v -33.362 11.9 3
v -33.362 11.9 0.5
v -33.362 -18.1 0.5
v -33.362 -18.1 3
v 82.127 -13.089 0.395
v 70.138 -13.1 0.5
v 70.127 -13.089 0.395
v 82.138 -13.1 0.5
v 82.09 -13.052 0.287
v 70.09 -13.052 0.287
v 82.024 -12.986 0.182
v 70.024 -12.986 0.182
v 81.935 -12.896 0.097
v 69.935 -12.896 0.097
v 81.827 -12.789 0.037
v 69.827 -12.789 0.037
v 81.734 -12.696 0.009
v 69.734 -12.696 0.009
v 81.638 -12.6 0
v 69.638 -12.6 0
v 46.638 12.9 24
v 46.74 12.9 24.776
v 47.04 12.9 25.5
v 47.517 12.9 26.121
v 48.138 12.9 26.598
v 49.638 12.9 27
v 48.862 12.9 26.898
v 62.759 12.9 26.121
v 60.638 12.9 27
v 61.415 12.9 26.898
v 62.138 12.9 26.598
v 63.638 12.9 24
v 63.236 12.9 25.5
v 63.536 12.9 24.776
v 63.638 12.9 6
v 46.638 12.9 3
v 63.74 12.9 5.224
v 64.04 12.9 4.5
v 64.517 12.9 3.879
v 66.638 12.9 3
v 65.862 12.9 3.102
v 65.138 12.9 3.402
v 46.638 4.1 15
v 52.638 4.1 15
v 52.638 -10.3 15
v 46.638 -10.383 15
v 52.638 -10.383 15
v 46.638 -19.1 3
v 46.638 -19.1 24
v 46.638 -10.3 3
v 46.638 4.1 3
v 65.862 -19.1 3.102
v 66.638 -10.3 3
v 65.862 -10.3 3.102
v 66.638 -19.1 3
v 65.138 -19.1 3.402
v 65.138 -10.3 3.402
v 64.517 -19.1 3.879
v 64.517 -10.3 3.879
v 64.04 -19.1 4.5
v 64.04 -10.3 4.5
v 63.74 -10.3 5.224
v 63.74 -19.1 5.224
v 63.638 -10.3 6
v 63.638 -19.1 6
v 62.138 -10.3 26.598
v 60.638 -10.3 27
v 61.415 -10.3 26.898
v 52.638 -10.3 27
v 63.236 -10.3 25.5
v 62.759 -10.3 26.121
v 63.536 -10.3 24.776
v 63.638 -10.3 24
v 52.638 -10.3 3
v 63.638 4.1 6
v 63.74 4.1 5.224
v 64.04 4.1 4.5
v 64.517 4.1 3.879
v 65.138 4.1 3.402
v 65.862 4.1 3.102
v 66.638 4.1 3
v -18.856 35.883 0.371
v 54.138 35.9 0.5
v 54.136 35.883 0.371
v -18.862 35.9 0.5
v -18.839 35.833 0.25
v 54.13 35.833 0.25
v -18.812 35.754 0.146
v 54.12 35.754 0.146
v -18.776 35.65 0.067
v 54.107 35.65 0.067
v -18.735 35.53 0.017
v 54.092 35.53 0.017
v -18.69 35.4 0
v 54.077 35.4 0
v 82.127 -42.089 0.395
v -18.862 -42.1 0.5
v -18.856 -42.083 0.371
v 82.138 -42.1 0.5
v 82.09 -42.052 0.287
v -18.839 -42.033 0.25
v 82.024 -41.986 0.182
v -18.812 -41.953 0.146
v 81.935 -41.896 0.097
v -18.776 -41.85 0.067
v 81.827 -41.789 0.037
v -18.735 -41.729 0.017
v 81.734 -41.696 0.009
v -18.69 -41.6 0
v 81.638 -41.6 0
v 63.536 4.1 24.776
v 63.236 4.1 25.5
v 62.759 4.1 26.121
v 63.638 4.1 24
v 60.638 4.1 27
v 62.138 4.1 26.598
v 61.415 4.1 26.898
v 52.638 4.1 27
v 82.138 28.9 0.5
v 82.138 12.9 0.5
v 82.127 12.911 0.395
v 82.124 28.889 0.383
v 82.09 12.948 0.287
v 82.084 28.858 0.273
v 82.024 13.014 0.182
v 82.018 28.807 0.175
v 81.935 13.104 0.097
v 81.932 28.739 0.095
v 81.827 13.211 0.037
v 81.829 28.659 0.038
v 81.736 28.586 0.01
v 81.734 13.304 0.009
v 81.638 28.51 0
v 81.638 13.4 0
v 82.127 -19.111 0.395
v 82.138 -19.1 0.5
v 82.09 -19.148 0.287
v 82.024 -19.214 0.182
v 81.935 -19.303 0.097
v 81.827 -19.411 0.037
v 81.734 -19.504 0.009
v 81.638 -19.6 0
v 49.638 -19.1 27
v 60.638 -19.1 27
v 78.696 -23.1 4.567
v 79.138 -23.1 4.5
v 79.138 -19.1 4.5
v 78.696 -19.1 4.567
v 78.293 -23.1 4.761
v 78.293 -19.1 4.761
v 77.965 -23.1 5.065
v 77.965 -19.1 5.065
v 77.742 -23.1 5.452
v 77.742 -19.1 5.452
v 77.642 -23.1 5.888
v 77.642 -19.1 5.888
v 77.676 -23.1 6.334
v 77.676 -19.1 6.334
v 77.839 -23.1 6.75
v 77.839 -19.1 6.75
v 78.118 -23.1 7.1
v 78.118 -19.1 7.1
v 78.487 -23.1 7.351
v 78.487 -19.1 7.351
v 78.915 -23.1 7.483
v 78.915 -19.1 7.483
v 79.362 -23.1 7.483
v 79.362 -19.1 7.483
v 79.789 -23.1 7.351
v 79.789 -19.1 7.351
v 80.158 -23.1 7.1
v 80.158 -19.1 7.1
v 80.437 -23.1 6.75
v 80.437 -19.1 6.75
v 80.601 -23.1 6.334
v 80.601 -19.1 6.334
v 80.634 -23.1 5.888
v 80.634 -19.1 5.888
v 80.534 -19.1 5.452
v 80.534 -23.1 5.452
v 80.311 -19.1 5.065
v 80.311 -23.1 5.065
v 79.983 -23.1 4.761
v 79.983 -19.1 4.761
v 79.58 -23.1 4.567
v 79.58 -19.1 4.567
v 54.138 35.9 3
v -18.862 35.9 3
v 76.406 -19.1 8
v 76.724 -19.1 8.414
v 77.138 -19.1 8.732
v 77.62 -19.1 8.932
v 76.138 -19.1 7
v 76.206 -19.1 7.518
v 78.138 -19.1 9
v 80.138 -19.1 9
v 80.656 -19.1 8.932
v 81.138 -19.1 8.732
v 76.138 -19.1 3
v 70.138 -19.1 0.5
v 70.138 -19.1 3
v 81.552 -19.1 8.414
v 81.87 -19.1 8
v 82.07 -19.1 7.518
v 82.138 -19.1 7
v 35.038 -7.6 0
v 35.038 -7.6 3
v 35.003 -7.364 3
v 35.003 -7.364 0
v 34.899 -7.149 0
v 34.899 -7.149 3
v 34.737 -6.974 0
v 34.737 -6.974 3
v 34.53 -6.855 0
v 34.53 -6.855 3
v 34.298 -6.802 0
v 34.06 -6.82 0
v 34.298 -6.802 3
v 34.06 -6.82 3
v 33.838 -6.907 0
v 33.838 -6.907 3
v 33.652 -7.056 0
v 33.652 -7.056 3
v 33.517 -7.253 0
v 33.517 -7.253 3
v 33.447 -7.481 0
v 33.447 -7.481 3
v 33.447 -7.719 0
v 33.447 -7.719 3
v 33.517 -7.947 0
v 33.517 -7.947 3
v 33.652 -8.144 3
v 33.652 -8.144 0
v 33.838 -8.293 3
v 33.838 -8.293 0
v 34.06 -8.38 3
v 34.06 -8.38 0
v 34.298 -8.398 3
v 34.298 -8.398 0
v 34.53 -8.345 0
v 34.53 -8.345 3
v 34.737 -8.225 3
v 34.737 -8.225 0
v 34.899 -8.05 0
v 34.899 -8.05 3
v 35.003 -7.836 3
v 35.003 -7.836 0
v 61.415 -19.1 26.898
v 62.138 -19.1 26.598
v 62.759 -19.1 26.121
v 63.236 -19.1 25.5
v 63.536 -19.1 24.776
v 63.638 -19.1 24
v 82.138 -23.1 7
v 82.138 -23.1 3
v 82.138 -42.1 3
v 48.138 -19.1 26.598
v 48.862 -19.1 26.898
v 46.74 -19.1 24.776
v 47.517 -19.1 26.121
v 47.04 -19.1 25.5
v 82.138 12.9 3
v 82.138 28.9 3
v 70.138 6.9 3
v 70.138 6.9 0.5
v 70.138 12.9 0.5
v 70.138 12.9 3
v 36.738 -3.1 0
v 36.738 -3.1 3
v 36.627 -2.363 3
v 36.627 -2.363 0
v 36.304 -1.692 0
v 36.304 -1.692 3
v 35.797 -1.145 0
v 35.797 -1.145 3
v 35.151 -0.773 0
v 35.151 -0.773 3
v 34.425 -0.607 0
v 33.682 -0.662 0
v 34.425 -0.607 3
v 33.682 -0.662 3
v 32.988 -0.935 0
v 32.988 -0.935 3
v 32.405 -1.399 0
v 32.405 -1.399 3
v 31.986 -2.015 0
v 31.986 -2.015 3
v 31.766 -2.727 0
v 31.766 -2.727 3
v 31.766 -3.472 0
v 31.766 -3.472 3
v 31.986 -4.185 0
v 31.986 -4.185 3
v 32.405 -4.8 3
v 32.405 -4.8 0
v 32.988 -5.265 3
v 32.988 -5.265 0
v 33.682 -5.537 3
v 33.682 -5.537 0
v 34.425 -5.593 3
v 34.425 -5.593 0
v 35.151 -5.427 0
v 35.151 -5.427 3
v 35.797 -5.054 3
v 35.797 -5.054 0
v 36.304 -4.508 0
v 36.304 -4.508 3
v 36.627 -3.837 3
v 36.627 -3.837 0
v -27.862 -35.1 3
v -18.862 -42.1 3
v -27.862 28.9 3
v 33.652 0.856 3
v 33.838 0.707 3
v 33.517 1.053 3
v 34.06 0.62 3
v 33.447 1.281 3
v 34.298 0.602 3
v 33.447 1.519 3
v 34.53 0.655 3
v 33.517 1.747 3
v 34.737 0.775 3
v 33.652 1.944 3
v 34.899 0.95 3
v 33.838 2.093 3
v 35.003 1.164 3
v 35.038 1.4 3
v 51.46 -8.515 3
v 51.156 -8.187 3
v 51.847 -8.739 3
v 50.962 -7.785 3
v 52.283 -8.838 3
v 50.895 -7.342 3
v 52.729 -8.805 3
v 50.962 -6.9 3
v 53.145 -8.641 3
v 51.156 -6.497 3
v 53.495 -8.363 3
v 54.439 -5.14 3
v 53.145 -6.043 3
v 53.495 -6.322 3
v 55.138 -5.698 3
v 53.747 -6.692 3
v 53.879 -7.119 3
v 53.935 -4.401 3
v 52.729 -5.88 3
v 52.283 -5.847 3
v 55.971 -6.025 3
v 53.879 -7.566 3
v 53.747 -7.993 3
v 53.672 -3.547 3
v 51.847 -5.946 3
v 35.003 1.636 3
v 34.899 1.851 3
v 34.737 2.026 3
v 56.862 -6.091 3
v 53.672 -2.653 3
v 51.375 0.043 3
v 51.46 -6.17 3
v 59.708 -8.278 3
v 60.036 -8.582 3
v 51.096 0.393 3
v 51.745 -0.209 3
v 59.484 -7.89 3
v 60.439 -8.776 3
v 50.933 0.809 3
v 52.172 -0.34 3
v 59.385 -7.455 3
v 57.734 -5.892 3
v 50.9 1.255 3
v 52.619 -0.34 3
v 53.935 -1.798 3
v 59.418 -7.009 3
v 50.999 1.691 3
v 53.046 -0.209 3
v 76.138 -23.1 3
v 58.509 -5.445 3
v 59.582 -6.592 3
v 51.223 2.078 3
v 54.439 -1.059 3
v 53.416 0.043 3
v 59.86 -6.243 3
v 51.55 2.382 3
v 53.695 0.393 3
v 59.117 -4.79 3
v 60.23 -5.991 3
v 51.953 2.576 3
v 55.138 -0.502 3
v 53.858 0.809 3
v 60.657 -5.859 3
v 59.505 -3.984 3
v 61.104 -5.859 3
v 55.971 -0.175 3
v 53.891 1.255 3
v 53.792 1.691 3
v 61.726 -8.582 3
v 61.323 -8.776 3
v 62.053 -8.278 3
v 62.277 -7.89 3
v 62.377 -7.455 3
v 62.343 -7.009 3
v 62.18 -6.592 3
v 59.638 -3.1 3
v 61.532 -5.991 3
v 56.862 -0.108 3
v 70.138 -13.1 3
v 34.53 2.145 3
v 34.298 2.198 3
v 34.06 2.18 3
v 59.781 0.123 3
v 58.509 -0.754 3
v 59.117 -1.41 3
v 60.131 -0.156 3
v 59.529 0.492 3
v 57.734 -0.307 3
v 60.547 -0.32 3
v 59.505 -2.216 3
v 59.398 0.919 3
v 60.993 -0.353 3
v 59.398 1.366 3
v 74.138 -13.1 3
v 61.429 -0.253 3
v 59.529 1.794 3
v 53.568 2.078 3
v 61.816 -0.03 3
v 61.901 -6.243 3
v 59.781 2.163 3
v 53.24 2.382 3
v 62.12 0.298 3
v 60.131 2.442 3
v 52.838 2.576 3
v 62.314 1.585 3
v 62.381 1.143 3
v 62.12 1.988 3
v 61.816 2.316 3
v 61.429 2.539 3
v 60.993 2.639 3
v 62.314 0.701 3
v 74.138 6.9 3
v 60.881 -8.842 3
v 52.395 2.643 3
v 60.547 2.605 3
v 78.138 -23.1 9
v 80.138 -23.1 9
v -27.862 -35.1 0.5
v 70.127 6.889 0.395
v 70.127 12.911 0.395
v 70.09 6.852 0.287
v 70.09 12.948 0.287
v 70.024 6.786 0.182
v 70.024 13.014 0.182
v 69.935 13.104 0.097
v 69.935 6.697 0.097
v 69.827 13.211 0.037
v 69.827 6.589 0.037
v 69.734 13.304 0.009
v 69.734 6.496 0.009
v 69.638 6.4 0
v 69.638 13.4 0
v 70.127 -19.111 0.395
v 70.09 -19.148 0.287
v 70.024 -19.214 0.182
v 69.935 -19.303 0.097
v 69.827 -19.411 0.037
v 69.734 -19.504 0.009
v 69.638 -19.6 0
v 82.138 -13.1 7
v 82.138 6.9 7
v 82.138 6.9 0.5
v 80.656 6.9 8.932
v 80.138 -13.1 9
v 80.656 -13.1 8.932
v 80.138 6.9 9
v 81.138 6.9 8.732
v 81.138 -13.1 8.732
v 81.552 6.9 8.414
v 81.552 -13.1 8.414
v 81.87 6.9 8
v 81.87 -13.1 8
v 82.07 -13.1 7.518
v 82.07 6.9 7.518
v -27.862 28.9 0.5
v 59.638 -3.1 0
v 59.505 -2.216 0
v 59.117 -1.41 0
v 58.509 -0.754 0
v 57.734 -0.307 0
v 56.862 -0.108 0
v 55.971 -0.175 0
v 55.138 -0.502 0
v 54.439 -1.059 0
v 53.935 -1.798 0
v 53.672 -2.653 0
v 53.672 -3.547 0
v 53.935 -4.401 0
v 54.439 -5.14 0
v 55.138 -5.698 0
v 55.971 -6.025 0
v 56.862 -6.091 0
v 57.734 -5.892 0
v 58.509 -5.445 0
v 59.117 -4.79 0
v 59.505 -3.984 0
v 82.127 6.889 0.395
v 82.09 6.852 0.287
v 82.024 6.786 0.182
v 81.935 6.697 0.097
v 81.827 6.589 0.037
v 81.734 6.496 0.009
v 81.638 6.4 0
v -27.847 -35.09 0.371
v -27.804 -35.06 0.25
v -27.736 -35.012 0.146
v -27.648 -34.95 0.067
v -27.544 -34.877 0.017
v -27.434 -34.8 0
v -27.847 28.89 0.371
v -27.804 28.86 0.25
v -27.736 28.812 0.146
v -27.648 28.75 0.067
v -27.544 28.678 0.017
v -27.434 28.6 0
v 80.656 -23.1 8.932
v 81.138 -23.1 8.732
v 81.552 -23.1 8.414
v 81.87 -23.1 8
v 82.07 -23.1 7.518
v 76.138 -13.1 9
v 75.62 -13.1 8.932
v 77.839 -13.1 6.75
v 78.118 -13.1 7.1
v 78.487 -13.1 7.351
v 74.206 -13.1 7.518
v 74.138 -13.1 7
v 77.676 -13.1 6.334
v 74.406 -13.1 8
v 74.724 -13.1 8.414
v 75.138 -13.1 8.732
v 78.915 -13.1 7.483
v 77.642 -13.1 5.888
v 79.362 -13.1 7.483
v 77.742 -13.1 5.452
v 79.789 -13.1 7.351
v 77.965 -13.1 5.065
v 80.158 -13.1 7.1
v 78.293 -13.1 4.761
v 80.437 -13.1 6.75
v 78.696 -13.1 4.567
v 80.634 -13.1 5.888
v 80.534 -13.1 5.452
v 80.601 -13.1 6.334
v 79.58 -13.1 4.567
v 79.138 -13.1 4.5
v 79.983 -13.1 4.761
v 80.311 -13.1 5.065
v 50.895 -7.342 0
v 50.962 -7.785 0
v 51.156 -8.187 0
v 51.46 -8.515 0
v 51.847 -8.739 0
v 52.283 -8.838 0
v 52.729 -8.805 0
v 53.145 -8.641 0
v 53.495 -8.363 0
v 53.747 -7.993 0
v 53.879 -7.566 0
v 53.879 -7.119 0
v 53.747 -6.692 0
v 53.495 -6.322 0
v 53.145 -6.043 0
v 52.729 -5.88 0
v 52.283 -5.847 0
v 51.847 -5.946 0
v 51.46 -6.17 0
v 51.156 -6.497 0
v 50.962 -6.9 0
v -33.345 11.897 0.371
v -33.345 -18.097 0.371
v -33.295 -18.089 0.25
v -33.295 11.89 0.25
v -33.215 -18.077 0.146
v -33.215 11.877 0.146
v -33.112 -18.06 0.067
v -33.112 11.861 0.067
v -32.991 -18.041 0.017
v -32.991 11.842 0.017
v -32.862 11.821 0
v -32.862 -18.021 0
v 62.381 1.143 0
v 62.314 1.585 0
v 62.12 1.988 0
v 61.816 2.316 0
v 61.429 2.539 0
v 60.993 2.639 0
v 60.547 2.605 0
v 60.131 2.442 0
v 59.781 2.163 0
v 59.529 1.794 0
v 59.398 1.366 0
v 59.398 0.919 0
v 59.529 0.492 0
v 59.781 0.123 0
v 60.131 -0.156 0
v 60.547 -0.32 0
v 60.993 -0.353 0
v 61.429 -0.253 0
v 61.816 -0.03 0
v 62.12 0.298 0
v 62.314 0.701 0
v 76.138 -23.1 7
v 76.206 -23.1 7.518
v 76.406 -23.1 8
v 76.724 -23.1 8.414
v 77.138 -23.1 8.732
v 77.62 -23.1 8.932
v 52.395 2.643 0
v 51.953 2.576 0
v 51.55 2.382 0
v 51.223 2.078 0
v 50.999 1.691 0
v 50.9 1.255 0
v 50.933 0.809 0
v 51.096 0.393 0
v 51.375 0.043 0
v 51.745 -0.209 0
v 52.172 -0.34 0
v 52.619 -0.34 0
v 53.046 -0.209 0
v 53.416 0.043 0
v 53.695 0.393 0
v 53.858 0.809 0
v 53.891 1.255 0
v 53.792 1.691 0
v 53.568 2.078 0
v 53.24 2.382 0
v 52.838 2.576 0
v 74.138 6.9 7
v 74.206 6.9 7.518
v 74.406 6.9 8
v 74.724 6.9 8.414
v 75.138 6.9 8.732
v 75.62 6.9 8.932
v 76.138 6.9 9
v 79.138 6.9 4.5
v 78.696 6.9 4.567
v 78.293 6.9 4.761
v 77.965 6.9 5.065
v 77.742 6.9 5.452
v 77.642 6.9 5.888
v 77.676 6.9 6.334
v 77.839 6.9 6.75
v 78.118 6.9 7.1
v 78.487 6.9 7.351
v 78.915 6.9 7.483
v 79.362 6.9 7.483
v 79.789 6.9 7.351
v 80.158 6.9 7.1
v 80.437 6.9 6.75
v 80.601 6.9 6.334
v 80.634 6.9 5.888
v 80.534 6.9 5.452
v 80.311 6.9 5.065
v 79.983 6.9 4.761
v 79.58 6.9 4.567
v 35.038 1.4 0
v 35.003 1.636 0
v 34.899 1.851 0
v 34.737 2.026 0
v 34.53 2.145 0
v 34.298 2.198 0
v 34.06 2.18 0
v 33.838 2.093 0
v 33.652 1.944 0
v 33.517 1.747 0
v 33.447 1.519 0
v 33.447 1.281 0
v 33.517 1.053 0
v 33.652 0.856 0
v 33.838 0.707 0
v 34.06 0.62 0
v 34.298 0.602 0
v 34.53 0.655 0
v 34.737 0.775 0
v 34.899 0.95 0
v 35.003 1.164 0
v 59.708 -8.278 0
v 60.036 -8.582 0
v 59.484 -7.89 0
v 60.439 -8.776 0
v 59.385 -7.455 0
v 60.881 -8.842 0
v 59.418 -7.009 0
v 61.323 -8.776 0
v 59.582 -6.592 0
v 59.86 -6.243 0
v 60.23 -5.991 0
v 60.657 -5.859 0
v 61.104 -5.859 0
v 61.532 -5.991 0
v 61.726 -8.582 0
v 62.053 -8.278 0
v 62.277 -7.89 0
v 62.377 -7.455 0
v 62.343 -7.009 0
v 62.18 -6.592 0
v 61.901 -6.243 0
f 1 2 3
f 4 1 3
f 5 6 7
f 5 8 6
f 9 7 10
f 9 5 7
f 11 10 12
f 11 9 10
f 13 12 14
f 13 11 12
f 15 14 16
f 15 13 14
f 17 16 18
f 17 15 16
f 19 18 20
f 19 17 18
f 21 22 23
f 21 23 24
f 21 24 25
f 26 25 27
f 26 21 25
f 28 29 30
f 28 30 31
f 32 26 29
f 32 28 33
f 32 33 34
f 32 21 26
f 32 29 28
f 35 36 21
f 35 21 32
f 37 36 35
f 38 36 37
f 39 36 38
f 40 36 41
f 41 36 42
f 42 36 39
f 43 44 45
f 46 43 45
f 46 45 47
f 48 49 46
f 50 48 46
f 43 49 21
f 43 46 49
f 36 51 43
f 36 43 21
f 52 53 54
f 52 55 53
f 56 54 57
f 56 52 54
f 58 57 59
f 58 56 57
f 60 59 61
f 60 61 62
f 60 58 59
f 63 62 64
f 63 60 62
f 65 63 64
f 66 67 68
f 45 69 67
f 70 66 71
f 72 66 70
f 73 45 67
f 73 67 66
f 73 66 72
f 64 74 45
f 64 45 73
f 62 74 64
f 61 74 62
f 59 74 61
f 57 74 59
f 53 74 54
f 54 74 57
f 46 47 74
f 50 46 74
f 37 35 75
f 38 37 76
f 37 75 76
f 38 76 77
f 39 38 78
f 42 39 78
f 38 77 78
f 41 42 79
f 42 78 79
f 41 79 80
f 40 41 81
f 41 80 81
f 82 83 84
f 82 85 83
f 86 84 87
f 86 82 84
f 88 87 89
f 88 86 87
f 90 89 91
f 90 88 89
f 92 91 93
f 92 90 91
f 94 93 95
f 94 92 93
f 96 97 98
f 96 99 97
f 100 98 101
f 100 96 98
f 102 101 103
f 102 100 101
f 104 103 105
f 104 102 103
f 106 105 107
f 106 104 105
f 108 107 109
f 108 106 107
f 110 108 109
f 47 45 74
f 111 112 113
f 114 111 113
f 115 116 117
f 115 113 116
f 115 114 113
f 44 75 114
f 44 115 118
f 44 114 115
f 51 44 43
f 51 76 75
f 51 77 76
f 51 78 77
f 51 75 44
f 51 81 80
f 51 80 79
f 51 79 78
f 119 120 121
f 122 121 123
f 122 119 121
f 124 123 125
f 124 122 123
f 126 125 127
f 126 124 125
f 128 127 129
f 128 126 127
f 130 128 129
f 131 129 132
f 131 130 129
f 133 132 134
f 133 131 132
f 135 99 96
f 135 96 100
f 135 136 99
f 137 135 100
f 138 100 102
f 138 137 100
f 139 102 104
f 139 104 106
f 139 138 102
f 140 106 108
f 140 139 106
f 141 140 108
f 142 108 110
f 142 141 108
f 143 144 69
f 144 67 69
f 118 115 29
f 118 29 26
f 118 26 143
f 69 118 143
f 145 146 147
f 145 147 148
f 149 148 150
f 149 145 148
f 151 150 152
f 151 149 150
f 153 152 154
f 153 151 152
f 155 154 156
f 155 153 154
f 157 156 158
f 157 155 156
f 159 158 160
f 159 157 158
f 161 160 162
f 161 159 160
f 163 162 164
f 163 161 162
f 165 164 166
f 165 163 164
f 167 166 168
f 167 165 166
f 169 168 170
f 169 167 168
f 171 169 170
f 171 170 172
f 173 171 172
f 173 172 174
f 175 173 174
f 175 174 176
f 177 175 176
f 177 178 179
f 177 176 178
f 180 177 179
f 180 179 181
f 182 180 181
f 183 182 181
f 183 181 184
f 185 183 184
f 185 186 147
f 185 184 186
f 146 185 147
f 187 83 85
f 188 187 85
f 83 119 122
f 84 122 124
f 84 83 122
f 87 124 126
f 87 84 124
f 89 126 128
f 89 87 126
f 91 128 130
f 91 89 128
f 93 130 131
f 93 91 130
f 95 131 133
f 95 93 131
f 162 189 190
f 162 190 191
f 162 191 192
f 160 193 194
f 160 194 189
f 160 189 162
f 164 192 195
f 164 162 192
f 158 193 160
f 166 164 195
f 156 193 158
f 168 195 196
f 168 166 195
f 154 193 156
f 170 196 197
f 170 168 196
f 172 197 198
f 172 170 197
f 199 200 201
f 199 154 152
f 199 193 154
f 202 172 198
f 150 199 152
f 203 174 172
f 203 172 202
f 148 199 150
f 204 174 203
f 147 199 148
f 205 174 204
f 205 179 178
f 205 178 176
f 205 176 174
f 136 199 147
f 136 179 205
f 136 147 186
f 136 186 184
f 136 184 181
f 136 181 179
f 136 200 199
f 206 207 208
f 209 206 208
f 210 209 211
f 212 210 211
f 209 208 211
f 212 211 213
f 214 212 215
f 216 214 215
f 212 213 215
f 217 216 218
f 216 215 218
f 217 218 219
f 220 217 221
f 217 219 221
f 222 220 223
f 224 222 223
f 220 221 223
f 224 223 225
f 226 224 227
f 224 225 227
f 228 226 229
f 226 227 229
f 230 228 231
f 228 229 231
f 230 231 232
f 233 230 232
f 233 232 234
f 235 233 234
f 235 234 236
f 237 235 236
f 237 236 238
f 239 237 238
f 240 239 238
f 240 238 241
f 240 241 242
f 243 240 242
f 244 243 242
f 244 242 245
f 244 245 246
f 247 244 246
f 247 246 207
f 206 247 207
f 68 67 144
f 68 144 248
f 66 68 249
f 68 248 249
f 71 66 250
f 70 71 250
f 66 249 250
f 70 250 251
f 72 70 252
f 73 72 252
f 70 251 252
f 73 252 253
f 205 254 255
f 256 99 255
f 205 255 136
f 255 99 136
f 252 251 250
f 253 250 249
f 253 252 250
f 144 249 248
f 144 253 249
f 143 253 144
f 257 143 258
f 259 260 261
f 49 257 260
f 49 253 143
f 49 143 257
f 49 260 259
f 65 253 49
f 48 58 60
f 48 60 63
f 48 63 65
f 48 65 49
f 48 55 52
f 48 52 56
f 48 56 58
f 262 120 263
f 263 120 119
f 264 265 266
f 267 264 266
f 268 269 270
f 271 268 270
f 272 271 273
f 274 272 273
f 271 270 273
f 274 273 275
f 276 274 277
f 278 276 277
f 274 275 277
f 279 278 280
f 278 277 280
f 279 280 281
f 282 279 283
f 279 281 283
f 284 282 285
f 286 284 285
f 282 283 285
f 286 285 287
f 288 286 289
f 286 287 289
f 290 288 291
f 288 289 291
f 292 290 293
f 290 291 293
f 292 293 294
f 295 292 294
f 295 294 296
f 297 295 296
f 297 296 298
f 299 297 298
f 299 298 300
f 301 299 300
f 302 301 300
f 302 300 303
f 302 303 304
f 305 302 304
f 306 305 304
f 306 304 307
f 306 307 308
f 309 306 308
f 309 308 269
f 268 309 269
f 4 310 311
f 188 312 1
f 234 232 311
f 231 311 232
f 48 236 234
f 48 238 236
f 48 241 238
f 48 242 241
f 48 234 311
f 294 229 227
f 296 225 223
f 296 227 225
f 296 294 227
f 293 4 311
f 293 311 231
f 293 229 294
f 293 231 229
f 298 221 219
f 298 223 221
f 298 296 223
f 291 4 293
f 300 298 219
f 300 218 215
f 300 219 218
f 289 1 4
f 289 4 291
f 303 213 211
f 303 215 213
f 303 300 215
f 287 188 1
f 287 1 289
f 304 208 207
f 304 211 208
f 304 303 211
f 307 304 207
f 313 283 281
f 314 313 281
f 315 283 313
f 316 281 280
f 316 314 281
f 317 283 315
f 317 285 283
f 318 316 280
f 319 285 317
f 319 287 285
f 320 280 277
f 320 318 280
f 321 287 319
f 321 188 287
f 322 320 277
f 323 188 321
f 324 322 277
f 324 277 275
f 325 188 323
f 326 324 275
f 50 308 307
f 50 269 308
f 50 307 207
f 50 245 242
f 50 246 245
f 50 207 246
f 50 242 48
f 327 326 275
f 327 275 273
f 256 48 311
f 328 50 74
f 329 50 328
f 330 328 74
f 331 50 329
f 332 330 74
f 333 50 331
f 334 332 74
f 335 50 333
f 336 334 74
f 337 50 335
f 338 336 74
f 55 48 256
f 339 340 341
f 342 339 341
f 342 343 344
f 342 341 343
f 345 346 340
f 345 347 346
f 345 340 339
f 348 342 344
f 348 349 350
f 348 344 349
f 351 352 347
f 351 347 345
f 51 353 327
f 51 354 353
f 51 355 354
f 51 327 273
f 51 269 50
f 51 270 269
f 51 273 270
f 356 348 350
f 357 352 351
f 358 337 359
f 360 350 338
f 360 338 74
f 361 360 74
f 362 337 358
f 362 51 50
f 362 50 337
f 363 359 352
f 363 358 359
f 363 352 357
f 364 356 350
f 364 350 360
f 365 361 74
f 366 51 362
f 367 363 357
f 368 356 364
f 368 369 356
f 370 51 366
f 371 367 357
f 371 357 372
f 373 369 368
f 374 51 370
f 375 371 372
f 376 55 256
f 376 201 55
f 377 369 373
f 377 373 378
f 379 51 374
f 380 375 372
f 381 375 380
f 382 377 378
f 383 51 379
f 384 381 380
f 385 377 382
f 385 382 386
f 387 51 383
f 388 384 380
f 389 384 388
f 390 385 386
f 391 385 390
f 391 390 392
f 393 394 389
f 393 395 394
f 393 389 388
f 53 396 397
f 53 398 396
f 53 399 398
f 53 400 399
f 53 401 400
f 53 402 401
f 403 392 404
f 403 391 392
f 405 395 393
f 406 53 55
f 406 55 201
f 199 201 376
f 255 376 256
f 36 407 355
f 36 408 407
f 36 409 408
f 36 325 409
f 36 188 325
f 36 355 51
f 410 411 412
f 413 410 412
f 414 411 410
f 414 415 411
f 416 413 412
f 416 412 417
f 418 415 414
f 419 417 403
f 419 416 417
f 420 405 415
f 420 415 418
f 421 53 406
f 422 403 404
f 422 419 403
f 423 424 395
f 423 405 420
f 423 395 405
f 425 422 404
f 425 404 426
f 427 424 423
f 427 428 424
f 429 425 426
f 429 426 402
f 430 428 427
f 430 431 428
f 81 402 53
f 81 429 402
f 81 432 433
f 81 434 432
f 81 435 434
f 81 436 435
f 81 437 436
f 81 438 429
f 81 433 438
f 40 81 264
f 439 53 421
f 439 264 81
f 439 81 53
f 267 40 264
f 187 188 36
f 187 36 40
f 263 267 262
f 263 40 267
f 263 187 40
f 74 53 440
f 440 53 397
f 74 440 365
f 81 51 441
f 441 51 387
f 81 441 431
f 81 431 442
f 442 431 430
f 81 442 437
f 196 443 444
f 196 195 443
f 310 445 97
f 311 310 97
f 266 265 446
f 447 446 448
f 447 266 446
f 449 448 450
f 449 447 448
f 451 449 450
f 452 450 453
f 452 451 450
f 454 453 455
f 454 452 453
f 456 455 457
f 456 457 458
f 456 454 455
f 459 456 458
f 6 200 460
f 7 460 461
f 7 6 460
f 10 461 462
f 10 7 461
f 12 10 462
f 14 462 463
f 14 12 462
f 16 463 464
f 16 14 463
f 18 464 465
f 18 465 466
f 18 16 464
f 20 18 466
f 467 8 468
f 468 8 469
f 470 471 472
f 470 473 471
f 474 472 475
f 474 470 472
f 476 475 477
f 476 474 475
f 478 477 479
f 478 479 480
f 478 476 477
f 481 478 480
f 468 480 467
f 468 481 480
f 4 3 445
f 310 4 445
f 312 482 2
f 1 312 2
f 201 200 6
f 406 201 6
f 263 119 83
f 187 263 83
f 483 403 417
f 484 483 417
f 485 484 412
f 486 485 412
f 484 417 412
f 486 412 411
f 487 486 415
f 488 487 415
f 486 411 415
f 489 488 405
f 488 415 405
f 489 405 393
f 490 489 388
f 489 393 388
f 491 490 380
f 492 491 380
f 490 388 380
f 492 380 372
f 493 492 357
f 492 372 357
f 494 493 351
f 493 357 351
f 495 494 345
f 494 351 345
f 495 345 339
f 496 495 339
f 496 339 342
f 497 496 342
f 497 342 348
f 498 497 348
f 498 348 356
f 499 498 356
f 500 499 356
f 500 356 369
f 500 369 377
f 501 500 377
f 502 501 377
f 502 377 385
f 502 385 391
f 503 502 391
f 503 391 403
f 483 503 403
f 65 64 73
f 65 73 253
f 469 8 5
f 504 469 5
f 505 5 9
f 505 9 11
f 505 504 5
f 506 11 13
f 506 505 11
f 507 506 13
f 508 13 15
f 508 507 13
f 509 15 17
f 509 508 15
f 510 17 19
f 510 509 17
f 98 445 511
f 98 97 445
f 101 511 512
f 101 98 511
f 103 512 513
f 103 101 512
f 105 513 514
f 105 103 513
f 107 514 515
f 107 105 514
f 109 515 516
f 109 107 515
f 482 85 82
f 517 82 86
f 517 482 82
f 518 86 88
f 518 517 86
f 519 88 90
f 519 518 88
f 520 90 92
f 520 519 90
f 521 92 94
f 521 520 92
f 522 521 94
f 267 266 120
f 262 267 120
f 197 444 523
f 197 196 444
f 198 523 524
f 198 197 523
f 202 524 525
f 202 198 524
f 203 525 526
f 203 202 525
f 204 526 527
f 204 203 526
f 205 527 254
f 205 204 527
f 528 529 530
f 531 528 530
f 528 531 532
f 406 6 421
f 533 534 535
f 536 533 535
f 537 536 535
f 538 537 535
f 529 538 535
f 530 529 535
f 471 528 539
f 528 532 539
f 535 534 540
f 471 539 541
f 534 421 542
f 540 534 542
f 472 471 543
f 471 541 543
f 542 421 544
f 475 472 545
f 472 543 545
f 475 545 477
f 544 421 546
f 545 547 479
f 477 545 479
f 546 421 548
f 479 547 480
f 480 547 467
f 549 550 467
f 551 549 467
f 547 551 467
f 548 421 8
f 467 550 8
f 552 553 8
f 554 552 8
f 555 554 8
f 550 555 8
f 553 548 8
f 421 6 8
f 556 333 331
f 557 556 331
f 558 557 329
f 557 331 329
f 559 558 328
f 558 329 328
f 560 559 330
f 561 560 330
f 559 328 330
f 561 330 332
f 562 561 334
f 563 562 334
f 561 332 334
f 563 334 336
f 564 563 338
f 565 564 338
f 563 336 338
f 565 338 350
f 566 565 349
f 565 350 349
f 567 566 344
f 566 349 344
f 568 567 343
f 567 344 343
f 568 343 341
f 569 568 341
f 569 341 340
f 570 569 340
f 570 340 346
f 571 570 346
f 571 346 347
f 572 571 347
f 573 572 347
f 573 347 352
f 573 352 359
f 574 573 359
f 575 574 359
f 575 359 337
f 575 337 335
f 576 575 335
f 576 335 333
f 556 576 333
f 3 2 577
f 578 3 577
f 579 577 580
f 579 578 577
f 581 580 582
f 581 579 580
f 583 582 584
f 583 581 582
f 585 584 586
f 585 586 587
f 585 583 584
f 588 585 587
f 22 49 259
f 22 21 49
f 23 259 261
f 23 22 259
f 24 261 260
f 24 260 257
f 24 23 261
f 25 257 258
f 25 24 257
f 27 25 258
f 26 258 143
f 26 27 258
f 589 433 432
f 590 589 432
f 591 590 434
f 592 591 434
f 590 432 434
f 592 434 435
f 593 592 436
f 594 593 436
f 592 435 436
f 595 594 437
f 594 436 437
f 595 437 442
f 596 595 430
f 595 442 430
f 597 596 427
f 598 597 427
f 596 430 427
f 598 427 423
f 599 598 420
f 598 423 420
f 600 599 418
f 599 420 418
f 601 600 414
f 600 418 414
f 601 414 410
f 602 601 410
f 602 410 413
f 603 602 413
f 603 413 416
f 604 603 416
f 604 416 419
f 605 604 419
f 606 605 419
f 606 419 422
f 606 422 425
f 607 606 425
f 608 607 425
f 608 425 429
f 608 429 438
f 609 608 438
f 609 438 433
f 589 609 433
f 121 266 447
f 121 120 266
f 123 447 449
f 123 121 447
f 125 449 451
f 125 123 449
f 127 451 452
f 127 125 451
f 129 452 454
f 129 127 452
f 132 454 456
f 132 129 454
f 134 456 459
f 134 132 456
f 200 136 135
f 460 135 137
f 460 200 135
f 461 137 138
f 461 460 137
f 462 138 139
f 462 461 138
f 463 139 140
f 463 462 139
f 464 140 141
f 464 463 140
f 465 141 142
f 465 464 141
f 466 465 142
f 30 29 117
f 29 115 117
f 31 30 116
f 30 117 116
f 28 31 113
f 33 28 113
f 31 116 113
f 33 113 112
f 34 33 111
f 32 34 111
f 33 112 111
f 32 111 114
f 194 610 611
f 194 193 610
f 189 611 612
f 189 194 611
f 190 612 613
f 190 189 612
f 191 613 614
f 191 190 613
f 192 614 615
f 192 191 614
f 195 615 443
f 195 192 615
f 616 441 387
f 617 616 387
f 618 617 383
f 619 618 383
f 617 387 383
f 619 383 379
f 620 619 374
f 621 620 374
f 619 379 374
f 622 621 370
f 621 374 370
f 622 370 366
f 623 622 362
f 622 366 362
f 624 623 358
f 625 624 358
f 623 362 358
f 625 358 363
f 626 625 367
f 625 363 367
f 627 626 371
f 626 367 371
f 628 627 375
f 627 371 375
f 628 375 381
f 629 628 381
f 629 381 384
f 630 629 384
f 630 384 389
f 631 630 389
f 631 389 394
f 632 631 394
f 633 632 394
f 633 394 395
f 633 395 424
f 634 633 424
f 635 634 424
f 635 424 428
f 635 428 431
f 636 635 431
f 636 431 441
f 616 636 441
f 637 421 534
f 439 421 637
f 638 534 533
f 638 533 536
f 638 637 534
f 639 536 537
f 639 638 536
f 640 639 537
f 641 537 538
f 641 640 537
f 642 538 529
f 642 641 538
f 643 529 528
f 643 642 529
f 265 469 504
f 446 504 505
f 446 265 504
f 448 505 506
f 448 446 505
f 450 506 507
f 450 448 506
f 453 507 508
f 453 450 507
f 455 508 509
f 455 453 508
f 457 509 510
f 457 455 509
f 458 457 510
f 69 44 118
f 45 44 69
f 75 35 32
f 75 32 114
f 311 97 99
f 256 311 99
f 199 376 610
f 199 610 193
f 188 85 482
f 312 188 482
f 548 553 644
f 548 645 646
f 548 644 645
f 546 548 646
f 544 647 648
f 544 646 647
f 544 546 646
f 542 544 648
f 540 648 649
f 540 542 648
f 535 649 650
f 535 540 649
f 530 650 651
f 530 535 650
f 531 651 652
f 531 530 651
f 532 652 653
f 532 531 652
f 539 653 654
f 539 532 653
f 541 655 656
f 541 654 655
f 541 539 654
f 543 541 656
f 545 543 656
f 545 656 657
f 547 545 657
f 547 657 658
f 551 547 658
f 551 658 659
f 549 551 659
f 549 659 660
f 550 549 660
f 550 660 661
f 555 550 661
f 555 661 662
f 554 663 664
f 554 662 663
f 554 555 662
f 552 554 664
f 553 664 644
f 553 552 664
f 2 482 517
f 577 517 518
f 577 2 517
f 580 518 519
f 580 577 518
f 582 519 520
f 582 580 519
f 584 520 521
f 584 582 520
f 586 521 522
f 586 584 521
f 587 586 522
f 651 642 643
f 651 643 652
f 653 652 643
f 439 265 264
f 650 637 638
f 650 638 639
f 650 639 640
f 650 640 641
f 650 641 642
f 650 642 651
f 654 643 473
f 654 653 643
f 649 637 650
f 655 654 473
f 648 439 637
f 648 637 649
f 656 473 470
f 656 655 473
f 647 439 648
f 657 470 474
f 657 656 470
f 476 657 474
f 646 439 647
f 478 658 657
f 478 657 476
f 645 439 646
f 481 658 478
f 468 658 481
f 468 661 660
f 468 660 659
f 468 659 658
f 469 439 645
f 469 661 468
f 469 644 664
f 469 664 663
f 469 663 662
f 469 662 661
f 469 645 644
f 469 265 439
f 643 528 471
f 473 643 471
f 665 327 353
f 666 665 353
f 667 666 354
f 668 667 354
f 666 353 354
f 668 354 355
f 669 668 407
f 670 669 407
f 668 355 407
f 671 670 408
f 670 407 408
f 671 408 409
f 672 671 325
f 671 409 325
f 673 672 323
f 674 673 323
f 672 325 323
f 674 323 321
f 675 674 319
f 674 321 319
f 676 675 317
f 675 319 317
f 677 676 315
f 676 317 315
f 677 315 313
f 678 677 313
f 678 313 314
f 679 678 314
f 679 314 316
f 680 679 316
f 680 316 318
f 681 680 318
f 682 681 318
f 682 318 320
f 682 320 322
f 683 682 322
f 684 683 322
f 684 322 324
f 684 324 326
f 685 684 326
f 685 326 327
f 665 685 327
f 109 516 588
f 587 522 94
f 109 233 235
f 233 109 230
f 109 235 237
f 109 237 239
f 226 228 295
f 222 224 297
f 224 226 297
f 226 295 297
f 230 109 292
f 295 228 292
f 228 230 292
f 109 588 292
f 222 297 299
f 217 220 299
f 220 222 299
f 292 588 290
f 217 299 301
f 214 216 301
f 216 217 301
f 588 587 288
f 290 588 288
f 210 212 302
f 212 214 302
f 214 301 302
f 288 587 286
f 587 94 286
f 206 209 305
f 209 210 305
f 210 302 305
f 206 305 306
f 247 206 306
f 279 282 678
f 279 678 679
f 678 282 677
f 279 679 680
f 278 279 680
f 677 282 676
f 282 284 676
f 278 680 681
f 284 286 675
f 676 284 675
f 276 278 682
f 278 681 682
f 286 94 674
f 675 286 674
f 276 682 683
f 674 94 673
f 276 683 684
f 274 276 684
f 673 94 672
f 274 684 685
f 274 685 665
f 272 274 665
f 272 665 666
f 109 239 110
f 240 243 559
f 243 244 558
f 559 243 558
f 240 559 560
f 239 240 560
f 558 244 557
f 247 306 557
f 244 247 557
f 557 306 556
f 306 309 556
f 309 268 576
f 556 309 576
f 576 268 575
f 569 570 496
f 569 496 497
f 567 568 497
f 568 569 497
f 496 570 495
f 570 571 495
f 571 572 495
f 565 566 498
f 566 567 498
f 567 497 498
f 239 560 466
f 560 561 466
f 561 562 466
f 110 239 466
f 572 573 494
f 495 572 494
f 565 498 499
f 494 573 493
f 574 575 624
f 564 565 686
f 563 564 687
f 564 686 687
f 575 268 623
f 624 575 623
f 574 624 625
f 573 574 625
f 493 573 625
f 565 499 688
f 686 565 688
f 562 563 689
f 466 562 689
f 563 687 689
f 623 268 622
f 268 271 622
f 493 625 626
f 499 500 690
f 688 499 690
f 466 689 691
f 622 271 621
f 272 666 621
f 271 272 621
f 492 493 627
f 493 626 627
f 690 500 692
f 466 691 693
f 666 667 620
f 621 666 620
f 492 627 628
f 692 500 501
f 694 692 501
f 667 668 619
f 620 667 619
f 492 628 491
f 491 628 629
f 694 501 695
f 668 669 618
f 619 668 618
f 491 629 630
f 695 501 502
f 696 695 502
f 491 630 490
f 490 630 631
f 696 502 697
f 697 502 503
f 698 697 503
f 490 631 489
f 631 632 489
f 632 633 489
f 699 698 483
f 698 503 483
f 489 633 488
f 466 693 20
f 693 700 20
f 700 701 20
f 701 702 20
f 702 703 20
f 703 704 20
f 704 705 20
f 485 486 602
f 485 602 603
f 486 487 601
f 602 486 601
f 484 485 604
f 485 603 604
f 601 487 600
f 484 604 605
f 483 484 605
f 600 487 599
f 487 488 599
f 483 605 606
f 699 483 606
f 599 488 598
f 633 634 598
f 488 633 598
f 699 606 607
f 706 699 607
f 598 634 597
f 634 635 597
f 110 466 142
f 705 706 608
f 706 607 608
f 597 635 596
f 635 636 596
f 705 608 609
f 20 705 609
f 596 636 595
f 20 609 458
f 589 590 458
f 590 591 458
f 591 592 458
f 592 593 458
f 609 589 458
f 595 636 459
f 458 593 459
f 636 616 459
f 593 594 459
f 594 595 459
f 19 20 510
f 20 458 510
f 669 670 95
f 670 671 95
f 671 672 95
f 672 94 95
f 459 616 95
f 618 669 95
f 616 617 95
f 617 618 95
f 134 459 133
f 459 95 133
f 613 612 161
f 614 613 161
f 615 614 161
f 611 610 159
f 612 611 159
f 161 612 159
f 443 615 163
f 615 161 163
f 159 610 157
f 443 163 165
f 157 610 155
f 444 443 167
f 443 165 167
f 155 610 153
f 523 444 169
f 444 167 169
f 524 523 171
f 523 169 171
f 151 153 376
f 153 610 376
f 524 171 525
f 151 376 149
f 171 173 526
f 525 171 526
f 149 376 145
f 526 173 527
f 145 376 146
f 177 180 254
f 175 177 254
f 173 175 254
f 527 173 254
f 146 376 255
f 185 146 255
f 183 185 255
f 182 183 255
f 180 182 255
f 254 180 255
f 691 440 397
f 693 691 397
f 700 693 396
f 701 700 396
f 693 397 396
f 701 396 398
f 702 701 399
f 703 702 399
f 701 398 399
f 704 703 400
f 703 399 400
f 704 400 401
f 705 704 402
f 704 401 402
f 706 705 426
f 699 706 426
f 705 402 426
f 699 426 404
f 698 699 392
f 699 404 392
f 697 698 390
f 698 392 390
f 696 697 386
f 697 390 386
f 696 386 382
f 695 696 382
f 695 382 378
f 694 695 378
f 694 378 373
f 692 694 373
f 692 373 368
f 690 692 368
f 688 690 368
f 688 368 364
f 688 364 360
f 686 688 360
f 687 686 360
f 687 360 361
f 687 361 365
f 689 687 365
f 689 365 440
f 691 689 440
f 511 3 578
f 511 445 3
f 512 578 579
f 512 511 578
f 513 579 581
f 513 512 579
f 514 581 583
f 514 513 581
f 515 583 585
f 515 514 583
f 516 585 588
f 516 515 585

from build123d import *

# Parameters (mm, degrees)
BOSS_EXTRUDE1_DEPTH     = 3
FILLET1_R               = 0.5
BOSS_EXTRUDE3_DEPTH     = 24
FILLET4_R               = 3
FILLET5_R               = 3
FILLET6_R               = 3
SKETCH4_W               = 6
SKETCH4_H               = 4
BOSS_EXTRUDE4_DEPTH     = 6
FILLET7_R               = 2
SKETCH7_W               = 8
SKETCH7_H               = 20
BOSS_EXTRUDE5_DEPTH     = 6
FILLET8_R               = 2
CUT_EXTRUDE1_DEPTH      = 31.137490822
CUT_EXTRUDE1_DEPTH_BACK = 7.874
SKETCH5_R               = 1.5
CUT_EXTRUDE2_DEPTH      = 31.137490822
SKETCH12_R              = 3
SKETCH12_R_2            = 2.5
CUT_EXTRUDE3_DEPTH      = 31.137490822
SKETCH13_R              = 1.5
CUT_EXTRUDE4_DEPTH      = 31.137490822
CIRPATTERN1_COUNT       = 4
SKETCH14_R              = 0.8
CUT_EXTRUDE5_DEPTH      = 31.137490822


with BuildPart() as part:
    # Sketch1 → Boss-Extrude1 (new body)
    with BuildSketch(Plane.XY):
        Polygon((-18.861888764, -42.099818659), (82.138111236, -42.099818659), (82.138111236, -19.099818659), (70.138111236, -19.099818659), (70.138111236, -13.099818659), (82.138111236, -13.099818659), (82.138111236, 6.900181341), (70.138111236, 6.900181341), (70.138111236, 12.900181341), (82.138111236, 12.900181341), (82.138111236, 28.900181341), (54.138111236, 35.900181341), (-18.861888764, 35.900181341), (-27.861888764, 28.900181341), (-33.361888764, 11.900181341), (-33.361888764, -18.099818659), (-27.861888764, -35.099818659), align=None)
    extrude(amount=BOSS_EXTRUDE1_DEPTH)

    # Fillet1
    fillet1_edges = [part.edges().sort_by_distance(p)[0] for p in [
        (-30.611888764, -26.599818659, 0),
        (-33.361888764, -3.099818659, 0),
        (-30.611888764, 20.400181341, 0),
        (-23.361888764, 32.400181341, 0),
        (17.638111236, 35.900181341, 0),
        (68.138111236, 32.400181341, 0),
        (82.138111236, 20.900181341, 0),
        (76.138111236, 12.900181341, 0),
        (70.138111236, 9.900181341, 0),
        (76.138111236, 6.900181341, 0),
        (82.138111236, -3.099818659, 0),
        (76.138111236, -13.099818659, 0),
        (70.138111236, -16.099818659, 0),
        (76.138111236, -19.099818659, 0),
        (82.138111236, -30.599818659, 0),
        (31.638111236, -42.099818659, 0),
        (-23.361888764, -38.599818659, 0),
    ]]
    fillet(fillet1_edges, radius=FILLET1_R)

    # Sketch2 → Boss-Extrude3 (add)
    with BuildSketch(Plane.XY.offset(3)):
        Polygon((63.638111236, -19.099818659), (46.638111236, -19.099818659), (46.638111236, 12.900181341), (63.638111236, 12.900181341), (63.638111236, 4.100181341), (52.638111236, 4.100181341), (52.638111236, -10.299818659), (63.638111236, -10.299818659), align=None)
    extrude(amount=BOSS_EXTRUDE3_DEPTH)

    # Fillet4
    fillet4_edges = [part.edges().sort_by_distance(p)[0] for p in [
        (46.638111236, -3.099818659, 27),
    ]]
    fillet(fillet4_edges, radius=FILLET4_R)

    # Fillet5
    fillet5_edges = [part.edges().sort_by_distance(p)[0] for p in [
        (63.638111236, 8.500181341, 27),
        (63.638111236, -14.699818659, 27),
    ]]
    fillet(fillet5_edges, radius=FILLET5_R)

    # Fillet6
    fillet6_edges = [part.edges().sort_by_distance(p)[0] for p in [
        (63.638111236, -14.699818659, 3),
        (63.638111236, 8.500181341, 3),
    ]]
    fillet(fillet6_edges, radius=FILLET6_R)

    # Sketch4 → Boss-Extrude4 (add)
    with BuildSketch(Plane.XY.offset(3)):
        with Locations((79.138111236, -21.099818659)):
            Rectangle(SKETCH4_W, SKETCH4_H)
    extrude(amount=BOSS_EXTRUDE4_DEPTH)

    # Fillet7
    fillet7_edges = [part.edges().sort_by_distance(p)[0] for p in [
        (82.138111236, -21.099818659, 9),
        (76.138111236, -21.099818659, 9),
    ]]
    fillet(fillet7_edges, radius=FILLET7_R)

    # Sketch7 → Boss-Extrude5 (add)
    with BuildSketch(Plane.XY.offset(3)):
        with Locations((78.138111236, -3.099818659)):
            Rectangle(SKETCH7_W, SKETCH7_H)
    extrude(amount=BOSS_EXTRUDE5_DEPTH)

    # Fillet8
    fillet8_edges = [part.edges().sort_by_distance(p)[0] for p in [
        (82.138111236, -3.099818659, 9),
        (74.138111236, -3.099818659, 9),
    ]]
    fillet(fillet8_edges, radius=FILLET8_R)

    # Sketch5 → Cut-Extrude1 (cut, two sides: drawn at the far end of the back side and taken through both)
    with BuildSketch(Plane(origin=(0, -19.099818659, 0), x_dir=(1, 0, 0), z_dir=(0, 1, 0)).offset(-CUT_EXTRUDE1_DEPTH_BACK)):
        with Locations(Location((79.138111236, -6, 0), (0, 0, 90))):
            Circle(SKETCH5_R)
    extrude(amount=CUT_EXTRUDE1_DEPTH + CUT_EXTRUDE1_DEPTH_BACK, mode=Mode.SUBTRACT)

    # Sketch11 → Cut-Extrude2 (cut)
    with BuildSketch(Plane(origin=(52.638111236, 0, 0), x_dir=(0, 0, -1), z_dir=(1, 0, 0))):
        Polygon((-3, 4.100181341), (-15, 4.100181341), (-15, -10.382699653), (-3, -10.299818659), align=None)
    extrude(amount=-CUT_EXTRUDE2_DEPTH, mode=Mode.SUBTRACT)

    # Sketch12 → Cut-Extrude3 (cut)
    with BuildSketch(Plane.XY.offset(3)):
        with Locations((56.638111236, -3.099818659)):
            Circle(SKETCH12_R)
        with Locations((34.238111236, -3.099818659)):
            Circle(SKETCH12_R_2)
    extrude(amount=-CUT_EXTRUDE3_DEPTH, mode=Mode.SUBTRACT)

    # Sketch13 → Cut-Extrude4 (cut)
    with BuildSketch(Plane.XY.offset(3)):
        with Locations((60.880751923, 1.142822028)):
            Circle(SKETCH13_R)
    cut_extrude4 = extrude(amount=-CUT_EXTRUDE4_DEPTH, mode=Mode.SUBTRACT)

    # CirPattern1: Cut-Extrude4 ×4 about axis
    cirpattern1_axis = Axis((56.638111236, -3.099818659, 0), (0, 0, 1))
    for i in range(1, CIRPATTERN1_COUNT):
        add(cut_extrude4.rotate(cirpattern1_axis, i * 360 / CIRPATTERN1_COUNT), mode=Mode.SUBTRACT)

    # Sketch14 → Cut-Extrude5 (cut)
    with BuildSketch(Plane.XY.offset(3)):
        with Locations((34.238111236, 1.400181341)):
            Circle(SKETCH14_R)
        with Locations((34.238111236, -7.599818659)):
            Circle(SKETCH14_R)
    extrude(amount=-CUT_EXTRUDE5_DEPTH, mode=Mode.SUBTRACT)


solid = part.part
